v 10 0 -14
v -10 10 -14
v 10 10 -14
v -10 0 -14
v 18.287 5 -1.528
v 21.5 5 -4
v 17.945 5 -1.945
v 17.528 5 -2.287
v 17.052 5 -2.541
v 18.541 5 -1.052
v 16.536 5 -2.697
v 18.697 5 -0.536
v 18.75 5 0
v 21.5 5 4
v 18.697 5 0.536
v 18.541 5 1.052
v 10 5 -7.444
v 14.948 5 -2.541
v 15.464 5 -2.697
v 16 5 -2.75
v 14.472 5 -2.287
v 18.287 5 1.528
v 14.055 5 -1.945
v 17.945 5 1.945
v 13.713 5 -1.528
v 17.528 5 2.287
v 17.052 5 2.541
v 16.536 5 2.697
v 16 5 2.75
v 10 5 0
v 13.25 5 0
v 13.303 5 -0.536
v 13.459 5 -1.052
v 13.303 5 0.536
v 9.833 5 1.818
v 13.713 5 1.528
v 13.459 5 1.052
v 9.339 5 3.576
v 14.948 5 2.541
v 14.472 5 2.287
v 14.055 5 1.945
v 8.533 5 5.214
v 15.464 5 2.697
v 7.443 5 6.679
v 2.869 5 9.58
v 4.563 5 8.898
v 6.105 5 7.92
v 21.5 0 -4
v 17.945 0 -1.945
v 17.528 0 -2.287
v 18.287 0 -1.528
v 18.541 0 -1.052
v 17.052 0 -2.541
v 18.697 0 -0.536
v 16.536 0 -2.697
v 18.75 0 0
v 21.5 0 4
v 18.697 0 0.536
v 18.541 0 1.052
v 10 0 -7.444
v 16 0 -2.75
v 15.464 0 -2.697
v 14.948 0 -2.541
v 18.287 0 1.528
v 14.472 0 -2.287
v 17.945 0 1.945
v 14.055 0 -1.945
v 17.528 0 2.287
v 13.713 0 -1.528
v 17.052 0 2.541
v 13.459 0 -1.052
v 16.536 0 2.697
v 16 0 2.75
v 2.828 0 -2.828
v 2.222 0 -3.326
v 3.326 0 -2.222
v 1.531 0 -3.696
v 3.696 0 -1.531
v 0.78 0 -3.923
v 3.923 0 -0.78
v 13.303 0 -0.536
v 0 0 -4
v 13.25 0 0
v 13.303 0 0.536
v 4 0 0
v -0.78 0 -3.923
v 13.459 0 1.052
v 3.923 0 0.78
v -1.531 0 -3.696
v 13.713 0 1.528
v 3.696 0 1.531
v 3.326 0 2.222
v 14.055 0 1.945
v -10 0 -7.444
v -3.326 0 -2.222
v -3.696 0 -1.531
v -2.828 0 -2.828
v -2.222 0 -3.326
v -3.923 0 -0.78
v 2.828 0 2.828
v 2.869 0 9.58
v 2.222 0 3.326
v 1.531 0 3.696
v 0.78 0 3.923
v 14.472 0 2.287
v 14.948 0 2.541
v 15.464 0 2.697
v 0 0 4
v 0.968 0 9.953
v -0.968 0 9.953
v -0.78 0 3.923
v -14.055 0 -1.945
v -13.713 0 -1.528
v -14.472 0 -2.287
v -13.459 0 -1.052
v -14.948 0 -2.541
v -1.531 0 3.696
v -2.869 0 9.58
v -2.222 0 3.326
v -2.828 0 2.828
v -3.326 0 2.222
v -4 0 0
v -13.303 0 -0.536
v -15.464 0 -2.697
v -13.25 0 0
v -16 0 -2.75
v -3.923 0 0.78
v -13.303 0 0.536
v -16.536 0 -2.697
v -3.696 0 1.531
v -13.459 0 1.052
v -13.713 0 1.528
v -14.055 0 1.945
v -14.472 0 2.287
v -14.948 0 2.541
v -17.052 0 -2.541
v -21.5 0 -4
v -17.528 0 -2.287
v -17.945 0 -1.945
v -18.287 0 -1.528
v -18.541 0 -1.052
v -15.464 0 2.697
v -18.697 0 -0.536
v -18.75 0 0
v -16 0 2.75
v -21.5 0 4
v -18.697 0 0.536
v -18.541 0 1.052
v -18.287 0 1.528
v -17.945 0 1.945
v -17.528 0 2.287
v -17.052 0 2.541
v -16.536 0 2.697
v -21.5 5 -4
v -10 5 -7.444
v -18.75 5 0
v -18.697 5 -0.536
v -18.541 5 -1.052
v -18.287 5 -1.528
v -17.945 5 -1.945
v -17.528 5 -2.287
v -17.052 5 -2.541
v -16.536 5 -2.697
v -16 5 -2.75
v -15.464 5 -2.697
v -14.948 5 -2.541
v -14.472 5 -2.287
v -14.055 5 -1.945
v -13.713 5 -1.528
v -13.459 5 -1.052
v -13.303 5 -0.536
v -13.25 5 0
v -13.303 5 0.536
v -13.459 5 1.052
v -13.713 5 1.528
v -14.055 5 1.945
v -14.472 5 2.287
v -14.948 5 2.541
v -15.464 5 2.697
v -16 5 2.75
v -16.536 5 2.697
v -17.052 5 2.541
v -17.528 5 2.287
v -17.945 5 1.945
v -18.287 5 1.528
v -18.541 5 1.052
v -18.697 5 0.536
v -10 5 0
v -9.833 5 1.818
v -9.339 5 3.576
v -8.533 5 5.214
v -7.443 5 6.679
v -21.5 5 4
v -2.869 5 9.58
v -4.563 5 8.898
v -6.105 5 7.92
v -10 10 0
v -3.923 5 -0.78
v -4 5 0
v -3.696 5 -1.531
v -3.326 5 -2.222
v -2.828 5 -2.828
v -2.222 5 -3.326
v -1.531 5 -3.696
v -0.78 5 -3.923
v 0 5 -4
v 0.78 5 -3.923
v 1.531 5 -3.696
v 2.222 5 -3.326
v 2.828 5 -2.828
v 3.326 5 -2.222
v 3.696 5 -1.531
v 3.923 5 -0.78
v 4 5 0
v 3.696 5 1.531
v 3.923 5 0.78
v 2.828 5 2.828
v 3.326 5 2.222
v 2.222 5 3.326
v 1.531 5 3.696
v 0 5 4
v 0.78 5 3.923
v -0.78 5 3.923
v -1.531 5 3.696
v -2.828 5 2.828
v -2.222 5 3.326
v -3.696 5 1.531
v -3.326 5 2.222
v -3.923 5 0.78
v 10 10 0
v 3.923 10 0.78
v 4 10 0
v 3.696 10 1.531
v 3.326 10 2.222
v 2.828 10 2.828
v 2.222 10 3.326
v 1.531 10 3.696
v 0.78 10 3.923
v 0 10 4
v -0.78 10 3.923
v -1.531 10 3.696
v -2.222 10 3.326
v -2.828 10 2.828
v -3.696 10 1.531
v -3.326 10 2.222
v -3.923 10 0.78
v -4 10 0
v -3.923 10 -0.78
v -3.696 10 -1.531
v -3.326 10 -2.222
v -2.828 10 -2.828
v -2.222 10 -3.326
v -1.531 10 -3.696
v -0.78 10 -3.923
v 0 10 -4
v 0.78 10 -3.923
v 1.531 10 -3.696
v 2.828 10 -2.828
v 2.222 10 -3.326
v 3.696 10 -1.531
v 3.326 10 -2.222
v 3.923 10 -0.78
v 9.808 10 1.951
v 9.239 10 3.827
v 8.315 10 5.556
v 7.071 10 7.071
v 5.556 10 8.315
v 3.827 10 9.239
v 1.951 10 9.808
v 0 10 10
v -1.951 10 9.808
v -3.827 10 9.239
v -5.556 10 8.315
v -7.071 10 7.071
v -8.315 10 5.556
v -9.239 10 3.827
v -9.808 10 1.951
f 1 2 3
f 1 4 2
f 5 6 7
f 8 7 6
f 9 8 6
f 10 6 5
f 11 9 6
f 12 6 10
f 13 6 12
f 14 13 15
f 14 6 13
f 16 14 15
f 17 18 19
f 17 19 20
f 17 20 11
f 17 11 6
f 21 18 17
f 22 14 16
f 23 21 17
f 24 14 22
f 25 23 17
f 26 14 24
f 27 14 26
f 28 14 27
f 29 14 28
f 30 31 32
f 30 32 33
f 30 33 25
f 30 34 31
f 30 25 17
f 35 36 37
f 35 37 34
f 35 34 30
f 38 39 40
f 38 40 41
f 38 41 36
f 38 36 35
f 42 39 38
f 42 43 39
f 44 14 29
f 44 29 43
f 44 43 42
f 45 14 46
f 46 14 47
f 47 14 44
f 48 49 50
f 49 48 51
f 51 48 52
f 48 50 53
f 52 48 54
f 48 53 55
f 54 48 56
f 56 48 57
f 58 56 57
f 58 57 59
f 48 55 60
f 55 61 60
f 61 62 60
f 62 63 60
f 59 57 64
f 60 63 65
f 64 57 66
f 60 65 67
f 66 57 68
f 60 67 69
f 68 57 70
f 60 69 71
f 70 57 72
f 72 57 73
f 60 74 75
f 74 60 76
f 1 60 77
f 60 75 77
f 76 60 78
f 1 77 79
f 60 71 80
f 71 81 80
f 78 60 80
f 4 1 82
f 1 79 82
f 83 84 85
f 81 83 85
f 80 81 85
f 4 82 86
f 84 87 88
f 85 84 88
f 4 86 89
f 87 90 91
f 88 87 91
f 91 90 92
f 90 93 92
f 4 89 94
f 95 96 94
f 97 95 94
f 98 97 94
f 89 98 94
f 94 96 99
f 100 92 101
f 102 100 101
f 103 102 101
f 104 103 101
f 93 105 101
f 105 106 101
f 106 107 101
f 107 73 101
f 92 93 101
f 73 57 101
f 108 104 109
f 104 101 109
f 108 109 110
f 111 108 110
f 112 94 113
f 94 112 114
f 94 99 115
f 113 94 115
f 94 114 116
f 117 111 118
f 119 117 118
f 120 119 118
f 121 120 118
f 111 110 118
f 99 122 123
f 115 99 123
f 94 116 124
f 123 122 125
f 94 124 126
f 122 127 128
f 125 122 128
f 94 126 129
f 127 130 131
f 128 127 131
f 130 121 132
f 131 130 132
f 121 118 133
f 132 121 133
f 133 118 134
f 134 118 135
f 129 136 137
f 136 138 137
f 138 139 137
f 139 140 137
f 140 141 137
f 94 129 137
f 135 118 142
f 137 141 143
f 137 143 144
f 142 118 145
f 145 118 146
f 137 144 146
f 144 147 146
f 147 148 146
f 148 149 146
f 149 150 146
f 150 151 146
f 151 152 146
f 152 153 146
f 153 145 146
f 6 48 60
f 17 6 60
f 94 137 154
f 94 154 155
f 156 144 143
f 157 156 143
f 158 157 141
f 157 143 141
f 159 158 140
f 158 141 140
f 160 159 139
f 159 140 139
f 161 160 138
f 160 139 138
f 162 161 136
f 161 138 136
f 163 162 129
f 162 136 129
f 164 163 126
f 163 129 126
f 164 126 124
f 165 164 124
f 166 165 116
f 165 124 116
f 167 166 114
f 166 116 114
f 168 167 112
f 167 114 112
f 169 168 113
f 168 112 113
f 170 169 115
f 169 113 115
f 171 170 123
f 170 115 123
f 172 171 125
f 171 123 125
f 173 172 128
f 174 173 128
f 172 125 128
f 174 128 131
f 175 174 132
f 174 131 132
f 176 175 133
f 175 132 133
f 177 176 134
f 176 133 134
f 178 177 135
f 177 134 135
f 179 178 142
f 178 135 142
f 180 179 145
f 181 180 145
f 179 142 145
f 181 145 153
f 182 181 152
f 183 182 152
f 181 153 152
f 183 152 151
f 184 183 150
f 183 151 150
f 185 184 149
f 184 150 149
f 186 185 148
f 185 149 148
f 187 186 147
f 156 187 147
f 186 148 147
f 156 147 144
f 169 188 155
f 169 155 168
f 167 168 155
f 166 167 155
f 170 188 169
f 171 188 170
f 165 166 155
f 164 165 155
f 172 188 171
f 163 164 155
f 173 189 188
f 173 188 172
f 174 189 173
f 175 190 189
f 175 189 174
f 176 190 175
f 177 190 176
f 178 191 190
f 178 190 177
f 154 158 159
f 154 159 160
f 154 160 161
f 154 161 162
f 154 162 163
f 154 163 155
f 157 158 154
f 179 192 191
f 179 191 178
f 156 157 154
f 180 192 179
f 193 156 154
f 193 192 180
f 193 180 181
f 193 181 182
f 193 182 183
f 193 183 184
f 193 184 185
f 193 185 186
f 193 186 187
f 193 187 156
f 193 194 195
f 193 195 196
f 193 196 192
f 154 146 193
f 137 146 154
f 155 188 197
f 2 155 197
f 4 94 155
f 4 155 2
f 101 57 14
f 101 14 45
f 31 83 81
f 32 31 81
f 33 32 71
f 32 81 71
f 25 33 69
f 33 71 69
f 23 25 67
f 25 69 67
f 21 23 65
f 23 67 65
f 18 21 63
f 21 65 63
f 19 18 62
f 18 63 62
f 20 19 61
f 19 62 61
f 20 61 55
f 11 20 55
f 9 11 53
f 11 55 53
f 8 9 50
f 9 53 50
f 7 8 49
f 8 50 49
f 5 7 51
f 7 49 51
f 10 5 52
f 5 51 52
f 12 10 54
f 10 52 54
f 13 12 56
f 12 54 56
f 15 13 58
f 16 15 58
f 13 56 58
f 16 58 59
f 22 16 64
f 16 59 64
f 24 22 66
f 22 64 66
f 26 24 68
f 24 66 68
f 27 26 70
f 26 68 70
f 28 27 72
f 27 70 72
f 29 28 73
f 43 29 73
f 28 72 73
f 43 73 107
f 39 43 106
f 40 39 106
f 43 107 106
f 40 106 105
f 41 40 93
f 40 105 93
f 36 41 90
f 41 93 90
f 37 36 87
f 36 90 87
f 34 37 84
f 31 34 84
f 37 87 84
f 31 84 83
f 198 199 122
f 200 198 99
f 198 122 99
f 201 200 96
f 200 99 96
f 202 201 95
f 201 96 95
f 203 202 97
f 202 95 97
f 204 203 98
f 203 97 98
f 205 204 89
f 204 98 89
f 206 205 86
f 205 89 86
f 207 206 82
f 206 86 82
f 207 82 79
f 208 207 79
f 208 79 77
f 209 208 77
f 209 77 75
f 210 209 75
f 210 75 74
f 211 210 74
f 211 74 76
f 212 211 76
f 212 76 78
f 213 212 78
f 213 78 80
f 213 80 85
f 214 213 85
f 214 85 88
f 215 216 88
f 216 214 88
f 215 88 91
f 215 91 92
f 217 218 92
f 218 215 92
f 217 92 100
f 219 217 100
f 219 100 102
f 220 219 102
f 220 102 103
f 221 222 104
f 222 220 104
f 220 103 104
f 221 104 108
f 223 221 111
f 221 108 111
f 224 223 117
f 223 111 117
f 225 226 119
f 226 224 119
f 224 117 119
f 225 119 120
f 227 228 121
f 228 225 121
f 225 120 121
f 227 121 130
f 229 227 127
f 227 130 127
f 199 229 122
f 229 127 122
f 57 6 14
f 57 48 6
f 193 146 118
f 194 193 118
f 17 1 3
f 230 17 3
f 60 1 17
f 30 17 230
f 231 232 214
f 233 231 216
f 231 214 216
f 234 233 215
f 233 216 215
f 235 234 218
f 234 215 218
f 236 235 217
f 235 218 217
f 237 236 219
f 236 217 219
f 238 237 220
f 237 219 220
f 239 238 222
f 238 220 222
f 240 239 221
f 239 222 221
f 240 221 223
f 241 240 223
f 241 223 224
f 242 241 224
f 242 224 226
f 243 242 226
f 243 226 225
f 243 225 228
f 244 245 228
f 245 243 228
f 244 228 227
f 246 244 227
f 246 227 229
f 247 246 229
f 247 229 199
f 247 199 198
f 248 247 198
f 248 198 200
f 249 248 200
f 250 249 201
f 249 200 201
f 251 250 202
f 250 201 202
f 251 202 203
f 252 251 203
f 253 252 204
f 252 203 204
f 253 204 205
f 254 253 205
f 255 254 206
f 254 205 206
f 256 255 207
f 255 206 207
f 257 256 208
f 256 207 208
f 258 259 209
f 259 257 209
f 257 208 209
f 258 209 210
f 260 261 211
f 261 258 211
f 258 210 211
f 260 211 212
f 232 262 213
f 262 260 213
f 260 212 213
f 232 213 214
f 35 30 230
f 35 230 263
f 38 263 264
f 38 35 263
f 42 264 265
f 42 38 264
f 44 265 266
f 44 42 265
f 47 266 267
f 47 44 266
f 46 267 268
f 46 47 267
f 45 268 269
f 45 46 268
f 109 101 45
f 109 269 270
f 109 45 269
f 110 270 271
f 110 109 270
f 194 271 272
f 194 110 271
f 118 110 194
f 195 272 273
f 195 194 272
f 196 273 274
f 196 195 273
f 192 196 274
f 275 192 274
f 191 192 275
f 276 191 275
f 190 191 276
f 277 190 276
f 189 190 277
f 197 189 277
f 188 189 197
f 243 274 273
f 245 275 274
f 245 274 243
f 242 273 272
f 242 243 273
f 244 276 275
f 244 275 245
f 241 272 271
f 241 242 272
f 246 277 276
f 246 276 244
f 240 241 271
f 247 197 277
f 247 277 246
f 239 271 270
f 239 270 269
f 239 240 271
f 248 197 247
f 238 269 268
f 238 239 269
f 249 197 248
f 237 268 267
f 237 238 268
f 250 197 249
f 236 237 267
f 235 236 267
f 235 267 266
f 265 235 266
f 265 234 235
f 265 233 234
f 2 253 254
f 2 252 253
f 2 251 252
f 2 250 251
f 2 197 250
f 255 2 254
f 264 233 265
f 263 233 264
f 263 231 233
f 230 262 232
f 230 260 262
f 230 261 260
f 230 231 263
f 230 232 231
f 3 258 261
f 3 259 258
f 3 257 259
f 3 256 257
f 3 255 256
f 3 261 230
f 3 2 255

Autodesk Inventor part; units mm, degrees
ref_plane "YZ Plane" through (0, 0, 0) normal (1, 0, 0) x (0, 1, 0)
ref_plane "XZ Plane" through (0, 0, 0) normal (0, 1, 0) x (-1, 0, 0)
ref_plane "XY Plane" through (0, 0, 0) normal (0, 0, 1) x (1, 0, 0)
sketch "Sketch1" plane through (0, 0, 0) normal (0, 1, 0) x (-1, 0, 0)
  circle A0 centre (0, 0) radius 4
  circle A1 centre (0, 0) radius 10
  circle A2 centre (-16, 0) radius 2.75
  line L0 (21.5, -4) -> (-21.5, -4)
  line L1 (-21.5, -4) -> (-21.5, 4)
  line L2 (-21.5, 4) -> (21.5, 4)
  line L3 (21.5, 4) -> (21.5, -4)
  line L4 (21.5, -4) -> (-21.5, 4) construction
  line L5 (-21.5, -4) -> (21.5, 4) construction
  line L6 (21.5, 0) -> (-21.5, 0)
  circle A3 centre (16, 0) radius 2.75
  line L7 (0, 10) -> (0, -14)
  line L8 (-21.5, 4) -> (-2.8689, 9.5796)
  line L9 (21.5, 4) -> (2.8689, 9.5796)
  line L10 (21.5, -4) -> (2.8689, -9.5796)
  line L11 (-21.5, -4) -> (-2.8689, -9.5796)
  line L12 (-10, -14) -> (10, -14)
  line L13 (10, -14) -> (10, -4)
  line L14 (10, 0) -> (-10, 0)
  line L15 (-10, -4) -> (-10, -14)
  dimension "d0" = 8
  dimension "d1" = 20
  dimension "d2" = 5.5
  dimension "d3" = 43
  dimension "d4" = 8
  dimension "d5" = 16
  dimension "d6" = 5.5
  dimension "d7" = 16
  dimension "d8" = 24
  dimension "d9" = 0
  dimension "d10" = 10
extrude "Extrusion1" add sketch "Sketch1" along normal blind 5 contours L6 A1 L0 A0 | A0 L2 A1 L6 | A0 L6 A1 L2 | L7 A1 L2 | L2 A1 L7 | L0 A1 L6 A0 | L7 A1 L0 | L0 A1 L7 | L6 A3 L3 L0 A1 | A1 L2 L3 L6 A3 | L2 L8 A1 | A1 L6 A2 L1 L2 | A1 L9 L2 | L0 L13 L10 A1 | L0 L1 L6 A2 A1 | A1 L11 L15 L0 | L7 L12 L15 L11 A1 | A1 L10 L13 L12 L7 | L0 L10 L13 | L15 L11 L0
sketch "Sketch2" plane through (0, 5, 0) normal (0, 1, 0) x (1, 0, 0)
  circle A0 centre (0, 0) radius 4 projected
  arc A1 (-10, 0) -> (10, 0) centre (0, 0) ccw
  line L0 (-10, 14) -> (10, 14)
  line L1 (10, 14) -> (10, 0)
  line L2 (-10, 0) -> (-10, 14)
  circle A2 centre (0, 0) radius 4
  dimension "d13" = 20
  dimension "d15" = 20
extrude "Extrusion2" add sketch "Sketch2" along normal blind 5
properties part number "shf8"
